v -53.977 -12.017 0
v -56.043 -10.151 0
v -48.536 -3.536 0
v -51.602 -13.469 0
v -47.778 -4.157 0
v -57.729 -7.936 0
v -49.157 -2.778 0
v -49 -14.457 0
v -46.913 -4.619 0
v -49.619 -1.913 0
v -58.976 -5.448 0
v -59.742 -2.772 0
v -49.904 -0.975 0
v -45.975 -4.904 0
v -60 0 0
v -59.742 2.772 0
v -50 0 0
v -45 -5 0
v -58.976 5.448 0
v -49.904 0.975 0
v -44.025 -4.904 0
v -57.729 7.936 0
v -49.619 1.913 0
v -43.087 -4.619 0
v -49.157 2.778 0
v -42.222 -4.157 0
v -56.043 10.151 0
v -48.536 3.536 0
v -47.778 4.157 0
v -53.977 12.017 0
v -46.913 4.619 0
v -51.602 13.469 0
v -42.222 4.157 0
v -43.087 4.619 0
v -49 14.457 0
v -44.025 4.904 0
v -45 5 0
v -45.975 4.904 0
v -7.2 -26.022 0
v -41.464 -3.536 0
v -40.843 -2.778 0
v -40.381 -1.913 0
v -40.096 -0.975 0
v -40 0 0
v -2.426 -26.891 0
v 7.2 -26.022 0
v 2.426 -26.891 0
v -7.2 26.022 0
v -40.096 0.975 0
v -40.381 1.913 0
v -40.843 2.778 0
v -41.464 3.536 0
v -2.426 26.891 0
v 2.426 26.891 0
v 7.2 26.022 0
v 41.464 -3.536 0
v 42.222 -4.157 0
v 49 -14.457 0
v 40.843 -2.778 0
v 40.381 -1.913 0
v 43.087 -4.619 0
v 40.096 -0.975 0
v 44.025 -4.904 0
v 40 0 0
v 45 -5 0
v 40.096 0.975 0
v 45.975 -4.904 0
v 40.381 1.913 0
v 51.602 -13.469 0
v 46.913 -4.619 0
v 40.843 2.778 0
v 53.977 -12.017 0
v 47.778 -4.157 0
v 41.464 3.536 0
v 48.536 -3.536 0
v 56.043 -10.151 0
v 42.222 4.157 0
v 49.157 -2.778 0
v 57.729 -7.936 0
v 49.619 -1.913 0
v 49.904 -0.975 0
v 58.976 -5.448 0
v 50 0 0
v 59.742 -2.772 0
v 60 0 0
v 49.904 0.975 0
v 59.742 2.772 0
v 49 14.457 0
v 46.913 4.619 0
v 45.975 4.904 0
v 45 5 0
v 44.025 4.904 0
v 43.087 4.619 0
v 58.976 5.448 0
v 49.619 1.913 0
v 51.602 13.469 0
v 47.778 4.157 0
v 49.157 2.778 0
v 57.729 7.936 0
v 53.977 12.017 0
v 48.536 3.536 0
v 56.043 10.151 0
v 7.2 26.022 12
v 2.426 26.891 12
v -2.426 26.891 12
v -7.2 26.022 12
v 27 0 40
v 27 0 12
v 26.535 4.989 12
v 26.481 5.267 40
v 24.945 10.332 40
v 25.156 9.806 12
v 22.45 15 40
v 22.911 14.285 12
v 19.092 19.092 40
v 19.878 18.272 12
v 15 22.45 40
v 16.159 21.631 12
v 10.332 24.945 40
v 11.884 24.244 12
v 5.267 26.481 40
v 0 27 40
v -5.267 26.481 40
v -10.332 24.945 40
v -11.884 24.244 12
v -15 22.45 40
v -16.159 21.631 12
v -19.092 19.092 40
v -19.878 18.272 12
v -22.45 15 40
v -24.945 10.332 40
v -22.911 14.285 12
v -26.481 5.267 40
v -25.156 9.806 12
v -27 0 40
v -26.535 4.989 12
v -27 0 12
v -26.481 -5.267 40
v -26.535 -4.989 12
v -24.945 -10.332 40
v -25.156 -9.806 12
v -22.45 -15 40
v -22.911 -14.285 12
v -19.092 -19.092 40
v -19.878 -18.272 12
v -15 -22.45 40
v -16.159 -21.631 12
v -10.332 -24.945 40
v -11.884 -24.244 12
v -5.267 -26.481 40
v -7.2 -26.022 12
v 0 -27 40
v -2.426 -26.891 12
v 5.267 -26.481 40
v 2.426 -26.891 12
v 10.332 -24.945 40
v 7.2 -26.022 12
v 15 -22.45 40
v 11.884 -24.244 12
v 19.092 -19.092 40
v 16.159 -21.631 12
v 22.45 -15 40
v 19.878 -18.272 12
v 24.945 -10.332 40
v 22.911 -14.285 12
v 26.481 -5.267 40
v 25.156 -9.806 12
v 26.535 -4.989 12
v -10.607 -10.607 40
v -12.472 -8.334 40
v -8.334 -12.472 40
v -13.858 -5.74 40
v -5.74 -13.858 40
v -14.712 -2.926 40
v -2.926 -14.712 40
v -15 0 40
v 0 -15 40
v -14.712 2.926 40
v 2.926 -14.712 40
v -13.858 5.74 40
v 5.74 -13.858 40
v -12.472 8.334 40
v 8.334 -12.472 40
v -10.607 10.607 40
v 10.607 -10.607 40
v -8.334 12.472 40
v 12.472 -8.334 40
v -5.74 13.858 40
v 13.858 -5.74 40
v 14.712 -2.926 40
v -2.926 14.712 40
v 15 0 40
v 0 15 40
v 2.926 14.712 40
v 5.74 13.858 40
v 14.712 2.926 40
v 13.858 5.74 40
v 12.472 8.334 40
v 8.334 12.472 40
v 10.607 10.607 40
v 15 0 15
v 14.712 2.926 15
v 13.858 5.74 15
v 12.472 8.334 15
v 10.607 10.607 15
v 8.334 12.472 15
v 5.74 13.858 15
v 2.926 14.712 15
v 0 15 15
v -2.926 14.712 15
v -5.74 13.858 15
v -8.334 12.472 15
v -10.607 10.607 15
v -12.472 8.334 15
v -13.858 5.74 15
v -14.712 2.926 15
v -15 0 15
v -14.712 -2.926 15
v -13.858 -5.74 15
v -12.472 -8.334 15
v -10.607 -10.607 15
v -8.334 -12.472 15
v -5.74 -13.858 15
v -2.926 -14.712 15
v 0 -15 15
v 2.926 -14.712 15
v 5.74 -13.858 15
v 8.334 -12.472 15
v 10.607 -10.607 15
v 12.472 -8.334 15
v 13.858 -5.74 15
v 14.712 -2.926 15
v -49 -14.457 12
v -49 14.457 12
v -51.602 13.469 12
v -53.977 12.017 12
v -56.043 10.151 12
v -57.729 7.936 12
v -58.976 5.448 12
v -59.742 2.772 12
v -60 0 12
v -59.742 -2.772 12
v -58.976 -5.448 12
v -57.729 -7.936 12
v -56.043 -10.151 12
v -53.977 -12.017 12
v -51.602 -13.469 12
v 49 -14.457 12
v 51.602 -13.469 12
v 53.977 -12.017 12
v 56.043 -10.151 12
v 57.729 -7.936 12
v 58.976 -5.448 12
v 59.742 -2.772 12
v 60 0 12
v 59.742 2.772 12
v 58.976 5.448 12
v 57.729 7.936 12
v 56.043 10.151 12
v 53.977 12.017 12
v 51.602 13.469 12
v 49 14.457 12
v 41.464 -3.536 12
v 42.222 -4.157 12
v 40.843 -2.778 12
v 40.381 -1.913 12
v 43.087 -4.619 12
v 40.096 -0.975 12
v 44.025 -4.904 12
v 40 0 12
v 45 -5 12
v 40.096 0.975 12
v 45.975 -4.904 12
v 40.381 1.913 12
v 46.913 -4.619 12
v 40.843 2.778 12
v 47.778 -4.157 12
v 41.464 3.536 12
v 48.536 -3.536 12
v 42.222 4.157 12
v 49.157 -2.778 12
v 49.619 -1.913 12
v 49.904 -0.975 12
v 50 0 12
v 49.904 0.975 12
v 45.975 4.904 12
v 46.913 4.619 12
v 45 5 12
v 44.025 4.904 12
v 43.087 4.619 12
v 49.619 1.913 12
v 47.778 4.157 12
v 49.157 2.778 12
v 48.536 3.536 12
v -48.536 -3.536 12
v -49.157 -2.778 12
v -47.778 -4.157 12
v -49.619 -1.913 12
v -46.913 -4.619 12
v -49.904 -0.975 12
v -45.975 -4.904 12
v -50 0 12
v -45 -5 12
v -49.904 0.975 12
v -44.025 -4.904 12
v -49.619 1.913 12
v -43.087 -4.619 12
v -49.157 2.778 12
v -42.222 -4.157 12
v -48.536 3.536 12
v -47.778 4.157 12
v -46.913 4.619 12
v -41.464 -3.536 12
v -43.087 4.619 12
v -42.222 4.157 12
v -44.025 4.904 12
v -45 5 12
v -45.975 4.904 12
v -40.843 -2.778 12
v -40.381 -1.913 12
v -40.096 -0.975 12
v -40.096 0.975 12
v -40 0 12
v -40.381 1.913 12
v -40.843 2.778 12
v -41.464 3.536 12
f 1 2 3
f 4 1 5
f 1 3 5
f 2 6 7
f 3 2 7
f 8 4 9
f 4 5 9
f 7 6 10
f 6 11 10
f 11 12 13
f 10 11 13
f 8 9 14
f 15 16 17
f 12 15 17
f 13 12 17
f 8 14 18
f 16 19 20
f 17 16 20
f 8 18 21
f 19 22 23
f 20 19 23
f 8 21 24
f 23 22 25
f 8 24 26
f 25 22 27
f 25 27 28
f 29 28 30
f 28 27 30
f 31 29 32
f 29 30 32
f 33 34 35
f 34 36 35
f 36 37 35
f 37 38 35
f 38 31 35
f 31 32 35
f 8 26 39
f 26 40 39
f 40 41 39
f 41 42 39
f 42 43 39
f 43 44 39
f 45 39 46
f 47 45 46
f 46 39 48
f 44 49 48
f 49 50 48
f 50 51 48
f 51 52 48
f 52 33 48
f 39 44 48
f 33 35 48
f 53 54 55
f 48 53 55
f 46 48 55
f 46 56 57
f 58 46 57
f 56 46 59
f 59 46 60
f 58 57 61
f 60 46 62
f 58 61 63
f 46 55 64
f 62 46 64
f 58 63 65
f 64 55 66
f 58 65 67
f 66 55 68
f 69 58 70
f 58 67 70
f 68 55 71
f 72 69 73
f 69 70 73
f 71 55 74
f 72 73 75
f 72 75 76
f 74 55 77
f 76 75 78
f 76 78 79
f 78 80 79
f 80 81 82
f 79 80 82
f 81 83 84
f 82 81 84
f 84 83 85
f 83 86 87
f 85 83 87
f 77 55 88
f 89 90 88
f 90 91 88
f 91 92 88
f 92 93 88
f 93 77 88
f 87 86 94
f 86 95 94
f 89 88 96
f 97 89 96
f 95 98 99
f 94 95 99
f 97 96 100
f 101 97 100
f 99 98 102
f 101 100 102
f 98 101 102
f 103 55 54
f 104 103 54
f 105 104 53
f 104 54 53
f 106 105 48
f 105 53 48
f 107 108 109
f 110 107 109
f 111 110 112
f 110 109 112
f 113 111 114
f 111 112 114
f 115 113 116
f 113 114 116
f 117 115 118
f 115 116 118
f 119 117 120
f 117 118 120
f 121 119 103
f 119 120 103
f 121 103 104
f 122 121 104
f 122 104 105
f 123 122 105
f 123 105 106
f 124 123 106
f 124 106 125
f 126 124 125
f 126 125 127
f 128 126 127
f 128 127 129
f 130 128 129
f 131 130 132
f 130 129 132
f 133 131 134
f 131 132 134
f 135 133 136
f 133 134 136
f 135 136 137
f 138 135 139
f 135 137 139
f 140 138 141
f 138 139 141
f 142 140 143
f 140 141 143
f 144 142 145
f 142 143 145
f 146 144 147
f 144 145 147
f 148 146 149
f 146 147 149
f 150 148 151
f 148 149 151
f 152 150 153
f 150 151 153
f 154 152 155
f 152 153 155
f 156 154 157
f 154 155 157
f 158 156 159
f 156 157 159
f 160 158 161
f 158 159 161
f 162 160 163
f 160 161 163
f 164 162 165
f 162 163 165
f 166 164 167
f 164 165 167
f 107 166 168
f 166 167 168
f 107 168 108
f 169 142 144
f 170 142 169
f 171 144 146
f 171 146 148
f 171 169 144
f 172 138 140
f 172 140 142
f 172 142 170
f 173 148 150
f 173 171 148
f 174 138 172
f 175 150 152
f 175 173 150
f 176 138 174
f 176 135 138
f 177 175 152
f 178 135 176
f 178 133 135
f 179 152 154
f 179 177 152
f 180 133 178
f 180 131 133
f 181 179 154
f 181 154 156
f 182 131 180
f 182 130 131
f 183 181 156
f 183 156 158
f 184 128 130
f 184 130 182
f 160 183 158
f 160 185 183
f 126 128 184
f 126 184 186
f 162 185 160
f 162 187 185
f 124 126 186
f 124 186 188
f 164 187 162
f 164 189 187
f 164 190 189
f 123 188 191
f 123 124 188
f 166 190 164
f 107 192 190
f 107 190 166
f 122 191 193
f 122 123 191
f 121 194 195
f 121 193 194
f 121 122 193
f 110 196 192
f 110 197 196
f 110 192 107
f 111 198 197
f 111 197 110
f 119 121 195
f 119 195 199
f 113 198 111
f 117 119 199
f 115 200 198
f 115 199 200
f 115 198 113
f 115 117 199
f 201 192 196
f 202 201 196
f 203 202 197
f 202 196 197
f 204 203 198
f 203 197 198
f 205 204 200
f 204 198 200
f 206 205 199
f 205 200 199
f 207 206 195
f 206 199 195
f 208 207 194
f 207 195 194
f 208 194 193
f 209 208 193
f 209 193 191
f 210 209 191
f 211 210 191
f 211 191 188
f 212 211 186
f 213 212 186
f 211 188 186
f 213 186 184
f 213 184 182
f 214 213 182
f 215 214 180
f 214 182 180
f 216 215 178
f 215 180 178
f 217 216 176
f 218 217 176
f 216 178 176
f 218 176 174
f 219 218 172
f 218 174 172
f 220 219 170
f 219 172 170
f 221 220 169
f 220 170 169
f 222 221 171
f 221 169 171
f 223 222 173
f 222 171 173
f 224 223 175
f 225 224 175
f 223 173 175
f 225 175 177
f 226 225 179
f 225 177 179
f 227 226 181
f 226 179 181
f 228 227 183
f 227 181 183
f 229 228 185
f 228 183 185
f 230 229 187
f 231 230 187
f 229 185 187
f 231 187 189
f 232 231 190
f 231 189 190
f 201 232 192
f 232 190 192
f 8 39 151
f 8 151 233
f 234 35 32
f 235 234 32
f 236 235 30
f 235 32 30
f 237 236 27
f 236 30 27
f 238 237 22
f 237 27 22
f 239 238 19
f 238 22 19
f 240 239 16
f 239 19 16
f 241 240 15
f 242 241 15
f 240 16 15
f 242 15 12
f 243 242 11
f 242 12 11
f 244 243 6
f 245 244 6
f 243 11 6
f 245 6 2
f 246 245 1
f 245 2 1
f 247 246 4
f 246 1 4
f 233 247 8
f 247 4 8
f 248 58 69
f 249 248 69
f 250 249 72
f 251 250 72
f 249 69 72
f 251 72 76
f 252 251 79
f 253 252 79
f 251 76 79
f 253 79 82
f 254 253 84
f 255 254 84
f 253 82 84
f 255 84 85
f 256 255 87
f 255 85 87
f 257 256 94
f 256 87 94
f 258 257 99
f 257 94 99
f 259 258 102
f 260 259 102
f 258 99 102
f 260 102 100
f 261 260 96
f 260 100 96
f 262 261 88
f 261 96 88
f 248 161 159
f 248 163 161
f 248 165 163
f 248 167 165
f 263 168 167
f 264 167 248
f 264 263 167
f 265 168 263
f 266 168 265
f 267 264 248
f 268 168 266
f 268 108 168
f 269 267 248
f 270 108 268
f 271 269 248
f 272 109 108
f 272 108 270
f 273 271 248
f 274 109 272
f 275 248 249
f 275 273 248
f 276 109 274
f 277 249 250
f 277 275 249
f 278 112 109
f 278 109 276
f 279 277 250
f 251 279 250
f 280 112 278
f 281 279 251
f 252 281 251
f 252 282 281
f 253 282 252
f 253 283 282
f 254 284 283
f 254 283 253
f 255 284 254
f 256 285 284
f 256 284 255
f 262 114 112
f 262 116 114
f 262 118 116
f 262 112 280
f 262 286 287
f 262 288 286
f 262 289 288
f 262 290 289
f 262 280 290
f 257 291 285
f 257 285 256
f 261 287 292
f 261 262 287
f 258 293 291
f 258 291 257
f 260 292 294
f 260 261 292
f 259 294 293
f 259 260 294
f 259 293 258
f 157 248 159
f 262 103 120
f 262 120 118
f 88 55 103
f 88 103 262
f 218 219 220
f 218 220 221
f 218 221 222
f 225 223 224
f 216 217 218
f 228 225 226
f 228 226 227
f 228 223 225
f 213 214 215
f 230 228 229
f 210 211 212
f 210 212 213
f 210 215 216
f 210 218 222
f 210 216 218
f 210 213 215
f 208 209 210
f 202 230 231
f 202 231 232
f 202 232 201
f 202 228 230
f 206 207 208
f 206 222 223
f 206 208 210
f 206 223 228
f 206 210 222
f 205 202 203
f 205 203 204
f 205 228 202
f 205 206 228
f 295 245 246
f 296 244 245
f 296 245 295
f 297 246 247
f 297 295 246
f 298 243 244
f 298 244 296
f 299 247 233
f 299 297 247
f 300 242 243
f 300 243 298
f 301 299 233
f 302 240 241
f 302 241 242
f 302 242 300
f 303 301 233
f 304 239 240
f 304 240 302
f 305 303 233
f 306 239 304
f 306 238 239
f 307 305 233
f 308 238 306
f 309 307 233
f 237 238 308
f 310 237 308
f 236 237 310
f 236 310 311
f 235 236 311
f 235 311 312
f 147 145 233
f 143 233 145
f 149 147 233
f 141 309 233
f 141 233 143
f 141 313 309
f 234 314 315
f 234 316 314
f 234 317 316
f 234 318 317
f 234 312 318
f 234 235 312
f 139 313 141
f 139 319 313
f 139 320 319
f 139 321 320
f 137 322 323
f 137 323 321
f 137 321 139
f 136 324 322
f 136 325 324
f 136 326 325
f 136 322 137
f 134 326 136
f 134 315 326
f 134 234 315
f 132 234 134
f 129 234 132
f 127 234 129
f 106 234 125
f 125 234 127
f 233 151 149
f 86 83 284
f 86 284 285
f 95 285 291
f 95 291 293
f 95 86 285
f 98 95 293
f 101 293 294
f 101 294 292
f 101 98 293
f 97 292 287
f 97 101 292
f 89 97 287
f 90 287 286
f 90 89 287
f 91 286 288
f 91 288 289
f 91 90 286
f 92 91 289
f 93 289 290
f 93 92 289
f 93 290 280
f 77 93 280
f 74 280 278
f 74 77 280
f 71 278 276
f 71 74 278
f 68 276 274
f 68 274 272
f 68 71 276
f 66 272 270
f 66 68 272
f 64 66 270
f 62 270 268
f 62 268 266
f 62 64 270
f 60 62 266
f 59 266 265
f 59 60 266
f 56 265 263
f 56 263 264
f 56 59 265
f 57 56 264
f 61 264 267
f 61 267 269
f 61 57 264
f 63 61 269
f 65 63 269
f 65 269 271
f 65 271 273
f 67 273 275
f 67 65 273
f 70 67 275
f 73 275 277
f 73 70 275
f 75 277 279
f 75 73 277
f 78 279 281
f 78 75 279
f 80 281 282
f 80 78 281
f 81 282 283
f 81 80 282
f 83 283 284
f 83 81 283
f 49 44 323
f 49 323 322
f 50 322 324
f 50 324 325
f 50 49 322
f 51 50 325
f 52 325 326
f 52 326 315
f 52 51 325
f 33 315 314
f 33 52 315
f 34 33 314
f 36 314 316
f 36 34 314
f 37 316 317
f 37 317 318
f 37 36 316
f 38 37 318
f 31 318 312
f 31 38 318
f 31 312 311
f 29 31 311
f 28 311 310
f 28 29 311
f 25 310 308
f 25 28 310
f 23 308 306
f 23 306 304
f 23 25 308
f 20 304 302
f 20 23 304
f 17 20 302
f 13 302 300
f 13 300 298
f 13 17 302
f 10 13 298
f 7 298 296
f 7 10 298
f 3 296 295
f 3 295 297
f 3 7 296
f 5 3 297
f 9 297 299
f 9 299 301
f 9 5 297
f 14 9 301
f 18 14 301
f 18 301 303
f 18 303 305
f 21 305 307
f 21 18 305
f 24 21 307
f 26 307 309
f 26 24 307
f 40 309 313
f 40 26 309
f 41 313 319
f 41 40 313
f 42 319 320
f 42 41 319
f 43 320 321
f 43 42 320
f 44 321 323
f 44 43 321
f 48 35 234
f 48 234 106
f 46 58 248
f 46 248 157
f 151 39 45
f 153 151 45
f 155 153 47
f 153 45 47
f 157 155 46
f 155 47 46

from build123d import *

# Parameters (mm, degrees)
SKETCH_R     = 5
PAD_DEPTH    = 12
SKETCH001_R  = 27
PAD001_DEPTH = 28
SKETCH002_R  = 15
POCKET_DEPTH = 25


with BuildPart() as part:
    # Sketch → Pad (new body)
    with BuildSketch(Plane.XY):
        with BuildLine():
            ThreePointArc((7.2, 26.022298), (0, 27), (-7.2, 26.022298))
            Line((-49, 14.456832), (-7.2, 26.022298))
            ThreePointArc((-49, 14.456832), (-60, -1.6e-05), (-48.999969, -14.456841))
            Line((-7.2, -26.022298), (-48.999969, -14.456841))
            ThreePointArc((-7.2, -26.022298), (0, -27), (7.2, -26.022298))
            Line((49, -14.456832), (7.2, -26.022298))
            ThreePointArc((49, -14.456832), (60, 0), (49, 14.456832))
            Line((7.2, 26.022298), (49, 14.456832))
        make_face()
        with Locations((45, 0)):
            Circle(SKETCH_R, mode=Mode.SUBTRACT)
        with Locations((-45, 0)):
            Circle(SKETCH_R, mode=Mode.SUBTRACT)
    extrude(amount=PAD_DEPTH)

    # Sketch001 → Pad001 (new body)
    with BuildSketch(Plane.XY.offset(12)):
        Circle(SKETCH001_R)
    extrude(amount=PAD001_DEPTH)

    # Sketch002 → Pocket (cut)
    with BuildSketch(Plane.XY.offset(40)):
        Circle(SKETCH002_R)
    extrude(amount=-POCKET_DEPTH, mode=Mode.SUBTRACT)


solid = part.part
